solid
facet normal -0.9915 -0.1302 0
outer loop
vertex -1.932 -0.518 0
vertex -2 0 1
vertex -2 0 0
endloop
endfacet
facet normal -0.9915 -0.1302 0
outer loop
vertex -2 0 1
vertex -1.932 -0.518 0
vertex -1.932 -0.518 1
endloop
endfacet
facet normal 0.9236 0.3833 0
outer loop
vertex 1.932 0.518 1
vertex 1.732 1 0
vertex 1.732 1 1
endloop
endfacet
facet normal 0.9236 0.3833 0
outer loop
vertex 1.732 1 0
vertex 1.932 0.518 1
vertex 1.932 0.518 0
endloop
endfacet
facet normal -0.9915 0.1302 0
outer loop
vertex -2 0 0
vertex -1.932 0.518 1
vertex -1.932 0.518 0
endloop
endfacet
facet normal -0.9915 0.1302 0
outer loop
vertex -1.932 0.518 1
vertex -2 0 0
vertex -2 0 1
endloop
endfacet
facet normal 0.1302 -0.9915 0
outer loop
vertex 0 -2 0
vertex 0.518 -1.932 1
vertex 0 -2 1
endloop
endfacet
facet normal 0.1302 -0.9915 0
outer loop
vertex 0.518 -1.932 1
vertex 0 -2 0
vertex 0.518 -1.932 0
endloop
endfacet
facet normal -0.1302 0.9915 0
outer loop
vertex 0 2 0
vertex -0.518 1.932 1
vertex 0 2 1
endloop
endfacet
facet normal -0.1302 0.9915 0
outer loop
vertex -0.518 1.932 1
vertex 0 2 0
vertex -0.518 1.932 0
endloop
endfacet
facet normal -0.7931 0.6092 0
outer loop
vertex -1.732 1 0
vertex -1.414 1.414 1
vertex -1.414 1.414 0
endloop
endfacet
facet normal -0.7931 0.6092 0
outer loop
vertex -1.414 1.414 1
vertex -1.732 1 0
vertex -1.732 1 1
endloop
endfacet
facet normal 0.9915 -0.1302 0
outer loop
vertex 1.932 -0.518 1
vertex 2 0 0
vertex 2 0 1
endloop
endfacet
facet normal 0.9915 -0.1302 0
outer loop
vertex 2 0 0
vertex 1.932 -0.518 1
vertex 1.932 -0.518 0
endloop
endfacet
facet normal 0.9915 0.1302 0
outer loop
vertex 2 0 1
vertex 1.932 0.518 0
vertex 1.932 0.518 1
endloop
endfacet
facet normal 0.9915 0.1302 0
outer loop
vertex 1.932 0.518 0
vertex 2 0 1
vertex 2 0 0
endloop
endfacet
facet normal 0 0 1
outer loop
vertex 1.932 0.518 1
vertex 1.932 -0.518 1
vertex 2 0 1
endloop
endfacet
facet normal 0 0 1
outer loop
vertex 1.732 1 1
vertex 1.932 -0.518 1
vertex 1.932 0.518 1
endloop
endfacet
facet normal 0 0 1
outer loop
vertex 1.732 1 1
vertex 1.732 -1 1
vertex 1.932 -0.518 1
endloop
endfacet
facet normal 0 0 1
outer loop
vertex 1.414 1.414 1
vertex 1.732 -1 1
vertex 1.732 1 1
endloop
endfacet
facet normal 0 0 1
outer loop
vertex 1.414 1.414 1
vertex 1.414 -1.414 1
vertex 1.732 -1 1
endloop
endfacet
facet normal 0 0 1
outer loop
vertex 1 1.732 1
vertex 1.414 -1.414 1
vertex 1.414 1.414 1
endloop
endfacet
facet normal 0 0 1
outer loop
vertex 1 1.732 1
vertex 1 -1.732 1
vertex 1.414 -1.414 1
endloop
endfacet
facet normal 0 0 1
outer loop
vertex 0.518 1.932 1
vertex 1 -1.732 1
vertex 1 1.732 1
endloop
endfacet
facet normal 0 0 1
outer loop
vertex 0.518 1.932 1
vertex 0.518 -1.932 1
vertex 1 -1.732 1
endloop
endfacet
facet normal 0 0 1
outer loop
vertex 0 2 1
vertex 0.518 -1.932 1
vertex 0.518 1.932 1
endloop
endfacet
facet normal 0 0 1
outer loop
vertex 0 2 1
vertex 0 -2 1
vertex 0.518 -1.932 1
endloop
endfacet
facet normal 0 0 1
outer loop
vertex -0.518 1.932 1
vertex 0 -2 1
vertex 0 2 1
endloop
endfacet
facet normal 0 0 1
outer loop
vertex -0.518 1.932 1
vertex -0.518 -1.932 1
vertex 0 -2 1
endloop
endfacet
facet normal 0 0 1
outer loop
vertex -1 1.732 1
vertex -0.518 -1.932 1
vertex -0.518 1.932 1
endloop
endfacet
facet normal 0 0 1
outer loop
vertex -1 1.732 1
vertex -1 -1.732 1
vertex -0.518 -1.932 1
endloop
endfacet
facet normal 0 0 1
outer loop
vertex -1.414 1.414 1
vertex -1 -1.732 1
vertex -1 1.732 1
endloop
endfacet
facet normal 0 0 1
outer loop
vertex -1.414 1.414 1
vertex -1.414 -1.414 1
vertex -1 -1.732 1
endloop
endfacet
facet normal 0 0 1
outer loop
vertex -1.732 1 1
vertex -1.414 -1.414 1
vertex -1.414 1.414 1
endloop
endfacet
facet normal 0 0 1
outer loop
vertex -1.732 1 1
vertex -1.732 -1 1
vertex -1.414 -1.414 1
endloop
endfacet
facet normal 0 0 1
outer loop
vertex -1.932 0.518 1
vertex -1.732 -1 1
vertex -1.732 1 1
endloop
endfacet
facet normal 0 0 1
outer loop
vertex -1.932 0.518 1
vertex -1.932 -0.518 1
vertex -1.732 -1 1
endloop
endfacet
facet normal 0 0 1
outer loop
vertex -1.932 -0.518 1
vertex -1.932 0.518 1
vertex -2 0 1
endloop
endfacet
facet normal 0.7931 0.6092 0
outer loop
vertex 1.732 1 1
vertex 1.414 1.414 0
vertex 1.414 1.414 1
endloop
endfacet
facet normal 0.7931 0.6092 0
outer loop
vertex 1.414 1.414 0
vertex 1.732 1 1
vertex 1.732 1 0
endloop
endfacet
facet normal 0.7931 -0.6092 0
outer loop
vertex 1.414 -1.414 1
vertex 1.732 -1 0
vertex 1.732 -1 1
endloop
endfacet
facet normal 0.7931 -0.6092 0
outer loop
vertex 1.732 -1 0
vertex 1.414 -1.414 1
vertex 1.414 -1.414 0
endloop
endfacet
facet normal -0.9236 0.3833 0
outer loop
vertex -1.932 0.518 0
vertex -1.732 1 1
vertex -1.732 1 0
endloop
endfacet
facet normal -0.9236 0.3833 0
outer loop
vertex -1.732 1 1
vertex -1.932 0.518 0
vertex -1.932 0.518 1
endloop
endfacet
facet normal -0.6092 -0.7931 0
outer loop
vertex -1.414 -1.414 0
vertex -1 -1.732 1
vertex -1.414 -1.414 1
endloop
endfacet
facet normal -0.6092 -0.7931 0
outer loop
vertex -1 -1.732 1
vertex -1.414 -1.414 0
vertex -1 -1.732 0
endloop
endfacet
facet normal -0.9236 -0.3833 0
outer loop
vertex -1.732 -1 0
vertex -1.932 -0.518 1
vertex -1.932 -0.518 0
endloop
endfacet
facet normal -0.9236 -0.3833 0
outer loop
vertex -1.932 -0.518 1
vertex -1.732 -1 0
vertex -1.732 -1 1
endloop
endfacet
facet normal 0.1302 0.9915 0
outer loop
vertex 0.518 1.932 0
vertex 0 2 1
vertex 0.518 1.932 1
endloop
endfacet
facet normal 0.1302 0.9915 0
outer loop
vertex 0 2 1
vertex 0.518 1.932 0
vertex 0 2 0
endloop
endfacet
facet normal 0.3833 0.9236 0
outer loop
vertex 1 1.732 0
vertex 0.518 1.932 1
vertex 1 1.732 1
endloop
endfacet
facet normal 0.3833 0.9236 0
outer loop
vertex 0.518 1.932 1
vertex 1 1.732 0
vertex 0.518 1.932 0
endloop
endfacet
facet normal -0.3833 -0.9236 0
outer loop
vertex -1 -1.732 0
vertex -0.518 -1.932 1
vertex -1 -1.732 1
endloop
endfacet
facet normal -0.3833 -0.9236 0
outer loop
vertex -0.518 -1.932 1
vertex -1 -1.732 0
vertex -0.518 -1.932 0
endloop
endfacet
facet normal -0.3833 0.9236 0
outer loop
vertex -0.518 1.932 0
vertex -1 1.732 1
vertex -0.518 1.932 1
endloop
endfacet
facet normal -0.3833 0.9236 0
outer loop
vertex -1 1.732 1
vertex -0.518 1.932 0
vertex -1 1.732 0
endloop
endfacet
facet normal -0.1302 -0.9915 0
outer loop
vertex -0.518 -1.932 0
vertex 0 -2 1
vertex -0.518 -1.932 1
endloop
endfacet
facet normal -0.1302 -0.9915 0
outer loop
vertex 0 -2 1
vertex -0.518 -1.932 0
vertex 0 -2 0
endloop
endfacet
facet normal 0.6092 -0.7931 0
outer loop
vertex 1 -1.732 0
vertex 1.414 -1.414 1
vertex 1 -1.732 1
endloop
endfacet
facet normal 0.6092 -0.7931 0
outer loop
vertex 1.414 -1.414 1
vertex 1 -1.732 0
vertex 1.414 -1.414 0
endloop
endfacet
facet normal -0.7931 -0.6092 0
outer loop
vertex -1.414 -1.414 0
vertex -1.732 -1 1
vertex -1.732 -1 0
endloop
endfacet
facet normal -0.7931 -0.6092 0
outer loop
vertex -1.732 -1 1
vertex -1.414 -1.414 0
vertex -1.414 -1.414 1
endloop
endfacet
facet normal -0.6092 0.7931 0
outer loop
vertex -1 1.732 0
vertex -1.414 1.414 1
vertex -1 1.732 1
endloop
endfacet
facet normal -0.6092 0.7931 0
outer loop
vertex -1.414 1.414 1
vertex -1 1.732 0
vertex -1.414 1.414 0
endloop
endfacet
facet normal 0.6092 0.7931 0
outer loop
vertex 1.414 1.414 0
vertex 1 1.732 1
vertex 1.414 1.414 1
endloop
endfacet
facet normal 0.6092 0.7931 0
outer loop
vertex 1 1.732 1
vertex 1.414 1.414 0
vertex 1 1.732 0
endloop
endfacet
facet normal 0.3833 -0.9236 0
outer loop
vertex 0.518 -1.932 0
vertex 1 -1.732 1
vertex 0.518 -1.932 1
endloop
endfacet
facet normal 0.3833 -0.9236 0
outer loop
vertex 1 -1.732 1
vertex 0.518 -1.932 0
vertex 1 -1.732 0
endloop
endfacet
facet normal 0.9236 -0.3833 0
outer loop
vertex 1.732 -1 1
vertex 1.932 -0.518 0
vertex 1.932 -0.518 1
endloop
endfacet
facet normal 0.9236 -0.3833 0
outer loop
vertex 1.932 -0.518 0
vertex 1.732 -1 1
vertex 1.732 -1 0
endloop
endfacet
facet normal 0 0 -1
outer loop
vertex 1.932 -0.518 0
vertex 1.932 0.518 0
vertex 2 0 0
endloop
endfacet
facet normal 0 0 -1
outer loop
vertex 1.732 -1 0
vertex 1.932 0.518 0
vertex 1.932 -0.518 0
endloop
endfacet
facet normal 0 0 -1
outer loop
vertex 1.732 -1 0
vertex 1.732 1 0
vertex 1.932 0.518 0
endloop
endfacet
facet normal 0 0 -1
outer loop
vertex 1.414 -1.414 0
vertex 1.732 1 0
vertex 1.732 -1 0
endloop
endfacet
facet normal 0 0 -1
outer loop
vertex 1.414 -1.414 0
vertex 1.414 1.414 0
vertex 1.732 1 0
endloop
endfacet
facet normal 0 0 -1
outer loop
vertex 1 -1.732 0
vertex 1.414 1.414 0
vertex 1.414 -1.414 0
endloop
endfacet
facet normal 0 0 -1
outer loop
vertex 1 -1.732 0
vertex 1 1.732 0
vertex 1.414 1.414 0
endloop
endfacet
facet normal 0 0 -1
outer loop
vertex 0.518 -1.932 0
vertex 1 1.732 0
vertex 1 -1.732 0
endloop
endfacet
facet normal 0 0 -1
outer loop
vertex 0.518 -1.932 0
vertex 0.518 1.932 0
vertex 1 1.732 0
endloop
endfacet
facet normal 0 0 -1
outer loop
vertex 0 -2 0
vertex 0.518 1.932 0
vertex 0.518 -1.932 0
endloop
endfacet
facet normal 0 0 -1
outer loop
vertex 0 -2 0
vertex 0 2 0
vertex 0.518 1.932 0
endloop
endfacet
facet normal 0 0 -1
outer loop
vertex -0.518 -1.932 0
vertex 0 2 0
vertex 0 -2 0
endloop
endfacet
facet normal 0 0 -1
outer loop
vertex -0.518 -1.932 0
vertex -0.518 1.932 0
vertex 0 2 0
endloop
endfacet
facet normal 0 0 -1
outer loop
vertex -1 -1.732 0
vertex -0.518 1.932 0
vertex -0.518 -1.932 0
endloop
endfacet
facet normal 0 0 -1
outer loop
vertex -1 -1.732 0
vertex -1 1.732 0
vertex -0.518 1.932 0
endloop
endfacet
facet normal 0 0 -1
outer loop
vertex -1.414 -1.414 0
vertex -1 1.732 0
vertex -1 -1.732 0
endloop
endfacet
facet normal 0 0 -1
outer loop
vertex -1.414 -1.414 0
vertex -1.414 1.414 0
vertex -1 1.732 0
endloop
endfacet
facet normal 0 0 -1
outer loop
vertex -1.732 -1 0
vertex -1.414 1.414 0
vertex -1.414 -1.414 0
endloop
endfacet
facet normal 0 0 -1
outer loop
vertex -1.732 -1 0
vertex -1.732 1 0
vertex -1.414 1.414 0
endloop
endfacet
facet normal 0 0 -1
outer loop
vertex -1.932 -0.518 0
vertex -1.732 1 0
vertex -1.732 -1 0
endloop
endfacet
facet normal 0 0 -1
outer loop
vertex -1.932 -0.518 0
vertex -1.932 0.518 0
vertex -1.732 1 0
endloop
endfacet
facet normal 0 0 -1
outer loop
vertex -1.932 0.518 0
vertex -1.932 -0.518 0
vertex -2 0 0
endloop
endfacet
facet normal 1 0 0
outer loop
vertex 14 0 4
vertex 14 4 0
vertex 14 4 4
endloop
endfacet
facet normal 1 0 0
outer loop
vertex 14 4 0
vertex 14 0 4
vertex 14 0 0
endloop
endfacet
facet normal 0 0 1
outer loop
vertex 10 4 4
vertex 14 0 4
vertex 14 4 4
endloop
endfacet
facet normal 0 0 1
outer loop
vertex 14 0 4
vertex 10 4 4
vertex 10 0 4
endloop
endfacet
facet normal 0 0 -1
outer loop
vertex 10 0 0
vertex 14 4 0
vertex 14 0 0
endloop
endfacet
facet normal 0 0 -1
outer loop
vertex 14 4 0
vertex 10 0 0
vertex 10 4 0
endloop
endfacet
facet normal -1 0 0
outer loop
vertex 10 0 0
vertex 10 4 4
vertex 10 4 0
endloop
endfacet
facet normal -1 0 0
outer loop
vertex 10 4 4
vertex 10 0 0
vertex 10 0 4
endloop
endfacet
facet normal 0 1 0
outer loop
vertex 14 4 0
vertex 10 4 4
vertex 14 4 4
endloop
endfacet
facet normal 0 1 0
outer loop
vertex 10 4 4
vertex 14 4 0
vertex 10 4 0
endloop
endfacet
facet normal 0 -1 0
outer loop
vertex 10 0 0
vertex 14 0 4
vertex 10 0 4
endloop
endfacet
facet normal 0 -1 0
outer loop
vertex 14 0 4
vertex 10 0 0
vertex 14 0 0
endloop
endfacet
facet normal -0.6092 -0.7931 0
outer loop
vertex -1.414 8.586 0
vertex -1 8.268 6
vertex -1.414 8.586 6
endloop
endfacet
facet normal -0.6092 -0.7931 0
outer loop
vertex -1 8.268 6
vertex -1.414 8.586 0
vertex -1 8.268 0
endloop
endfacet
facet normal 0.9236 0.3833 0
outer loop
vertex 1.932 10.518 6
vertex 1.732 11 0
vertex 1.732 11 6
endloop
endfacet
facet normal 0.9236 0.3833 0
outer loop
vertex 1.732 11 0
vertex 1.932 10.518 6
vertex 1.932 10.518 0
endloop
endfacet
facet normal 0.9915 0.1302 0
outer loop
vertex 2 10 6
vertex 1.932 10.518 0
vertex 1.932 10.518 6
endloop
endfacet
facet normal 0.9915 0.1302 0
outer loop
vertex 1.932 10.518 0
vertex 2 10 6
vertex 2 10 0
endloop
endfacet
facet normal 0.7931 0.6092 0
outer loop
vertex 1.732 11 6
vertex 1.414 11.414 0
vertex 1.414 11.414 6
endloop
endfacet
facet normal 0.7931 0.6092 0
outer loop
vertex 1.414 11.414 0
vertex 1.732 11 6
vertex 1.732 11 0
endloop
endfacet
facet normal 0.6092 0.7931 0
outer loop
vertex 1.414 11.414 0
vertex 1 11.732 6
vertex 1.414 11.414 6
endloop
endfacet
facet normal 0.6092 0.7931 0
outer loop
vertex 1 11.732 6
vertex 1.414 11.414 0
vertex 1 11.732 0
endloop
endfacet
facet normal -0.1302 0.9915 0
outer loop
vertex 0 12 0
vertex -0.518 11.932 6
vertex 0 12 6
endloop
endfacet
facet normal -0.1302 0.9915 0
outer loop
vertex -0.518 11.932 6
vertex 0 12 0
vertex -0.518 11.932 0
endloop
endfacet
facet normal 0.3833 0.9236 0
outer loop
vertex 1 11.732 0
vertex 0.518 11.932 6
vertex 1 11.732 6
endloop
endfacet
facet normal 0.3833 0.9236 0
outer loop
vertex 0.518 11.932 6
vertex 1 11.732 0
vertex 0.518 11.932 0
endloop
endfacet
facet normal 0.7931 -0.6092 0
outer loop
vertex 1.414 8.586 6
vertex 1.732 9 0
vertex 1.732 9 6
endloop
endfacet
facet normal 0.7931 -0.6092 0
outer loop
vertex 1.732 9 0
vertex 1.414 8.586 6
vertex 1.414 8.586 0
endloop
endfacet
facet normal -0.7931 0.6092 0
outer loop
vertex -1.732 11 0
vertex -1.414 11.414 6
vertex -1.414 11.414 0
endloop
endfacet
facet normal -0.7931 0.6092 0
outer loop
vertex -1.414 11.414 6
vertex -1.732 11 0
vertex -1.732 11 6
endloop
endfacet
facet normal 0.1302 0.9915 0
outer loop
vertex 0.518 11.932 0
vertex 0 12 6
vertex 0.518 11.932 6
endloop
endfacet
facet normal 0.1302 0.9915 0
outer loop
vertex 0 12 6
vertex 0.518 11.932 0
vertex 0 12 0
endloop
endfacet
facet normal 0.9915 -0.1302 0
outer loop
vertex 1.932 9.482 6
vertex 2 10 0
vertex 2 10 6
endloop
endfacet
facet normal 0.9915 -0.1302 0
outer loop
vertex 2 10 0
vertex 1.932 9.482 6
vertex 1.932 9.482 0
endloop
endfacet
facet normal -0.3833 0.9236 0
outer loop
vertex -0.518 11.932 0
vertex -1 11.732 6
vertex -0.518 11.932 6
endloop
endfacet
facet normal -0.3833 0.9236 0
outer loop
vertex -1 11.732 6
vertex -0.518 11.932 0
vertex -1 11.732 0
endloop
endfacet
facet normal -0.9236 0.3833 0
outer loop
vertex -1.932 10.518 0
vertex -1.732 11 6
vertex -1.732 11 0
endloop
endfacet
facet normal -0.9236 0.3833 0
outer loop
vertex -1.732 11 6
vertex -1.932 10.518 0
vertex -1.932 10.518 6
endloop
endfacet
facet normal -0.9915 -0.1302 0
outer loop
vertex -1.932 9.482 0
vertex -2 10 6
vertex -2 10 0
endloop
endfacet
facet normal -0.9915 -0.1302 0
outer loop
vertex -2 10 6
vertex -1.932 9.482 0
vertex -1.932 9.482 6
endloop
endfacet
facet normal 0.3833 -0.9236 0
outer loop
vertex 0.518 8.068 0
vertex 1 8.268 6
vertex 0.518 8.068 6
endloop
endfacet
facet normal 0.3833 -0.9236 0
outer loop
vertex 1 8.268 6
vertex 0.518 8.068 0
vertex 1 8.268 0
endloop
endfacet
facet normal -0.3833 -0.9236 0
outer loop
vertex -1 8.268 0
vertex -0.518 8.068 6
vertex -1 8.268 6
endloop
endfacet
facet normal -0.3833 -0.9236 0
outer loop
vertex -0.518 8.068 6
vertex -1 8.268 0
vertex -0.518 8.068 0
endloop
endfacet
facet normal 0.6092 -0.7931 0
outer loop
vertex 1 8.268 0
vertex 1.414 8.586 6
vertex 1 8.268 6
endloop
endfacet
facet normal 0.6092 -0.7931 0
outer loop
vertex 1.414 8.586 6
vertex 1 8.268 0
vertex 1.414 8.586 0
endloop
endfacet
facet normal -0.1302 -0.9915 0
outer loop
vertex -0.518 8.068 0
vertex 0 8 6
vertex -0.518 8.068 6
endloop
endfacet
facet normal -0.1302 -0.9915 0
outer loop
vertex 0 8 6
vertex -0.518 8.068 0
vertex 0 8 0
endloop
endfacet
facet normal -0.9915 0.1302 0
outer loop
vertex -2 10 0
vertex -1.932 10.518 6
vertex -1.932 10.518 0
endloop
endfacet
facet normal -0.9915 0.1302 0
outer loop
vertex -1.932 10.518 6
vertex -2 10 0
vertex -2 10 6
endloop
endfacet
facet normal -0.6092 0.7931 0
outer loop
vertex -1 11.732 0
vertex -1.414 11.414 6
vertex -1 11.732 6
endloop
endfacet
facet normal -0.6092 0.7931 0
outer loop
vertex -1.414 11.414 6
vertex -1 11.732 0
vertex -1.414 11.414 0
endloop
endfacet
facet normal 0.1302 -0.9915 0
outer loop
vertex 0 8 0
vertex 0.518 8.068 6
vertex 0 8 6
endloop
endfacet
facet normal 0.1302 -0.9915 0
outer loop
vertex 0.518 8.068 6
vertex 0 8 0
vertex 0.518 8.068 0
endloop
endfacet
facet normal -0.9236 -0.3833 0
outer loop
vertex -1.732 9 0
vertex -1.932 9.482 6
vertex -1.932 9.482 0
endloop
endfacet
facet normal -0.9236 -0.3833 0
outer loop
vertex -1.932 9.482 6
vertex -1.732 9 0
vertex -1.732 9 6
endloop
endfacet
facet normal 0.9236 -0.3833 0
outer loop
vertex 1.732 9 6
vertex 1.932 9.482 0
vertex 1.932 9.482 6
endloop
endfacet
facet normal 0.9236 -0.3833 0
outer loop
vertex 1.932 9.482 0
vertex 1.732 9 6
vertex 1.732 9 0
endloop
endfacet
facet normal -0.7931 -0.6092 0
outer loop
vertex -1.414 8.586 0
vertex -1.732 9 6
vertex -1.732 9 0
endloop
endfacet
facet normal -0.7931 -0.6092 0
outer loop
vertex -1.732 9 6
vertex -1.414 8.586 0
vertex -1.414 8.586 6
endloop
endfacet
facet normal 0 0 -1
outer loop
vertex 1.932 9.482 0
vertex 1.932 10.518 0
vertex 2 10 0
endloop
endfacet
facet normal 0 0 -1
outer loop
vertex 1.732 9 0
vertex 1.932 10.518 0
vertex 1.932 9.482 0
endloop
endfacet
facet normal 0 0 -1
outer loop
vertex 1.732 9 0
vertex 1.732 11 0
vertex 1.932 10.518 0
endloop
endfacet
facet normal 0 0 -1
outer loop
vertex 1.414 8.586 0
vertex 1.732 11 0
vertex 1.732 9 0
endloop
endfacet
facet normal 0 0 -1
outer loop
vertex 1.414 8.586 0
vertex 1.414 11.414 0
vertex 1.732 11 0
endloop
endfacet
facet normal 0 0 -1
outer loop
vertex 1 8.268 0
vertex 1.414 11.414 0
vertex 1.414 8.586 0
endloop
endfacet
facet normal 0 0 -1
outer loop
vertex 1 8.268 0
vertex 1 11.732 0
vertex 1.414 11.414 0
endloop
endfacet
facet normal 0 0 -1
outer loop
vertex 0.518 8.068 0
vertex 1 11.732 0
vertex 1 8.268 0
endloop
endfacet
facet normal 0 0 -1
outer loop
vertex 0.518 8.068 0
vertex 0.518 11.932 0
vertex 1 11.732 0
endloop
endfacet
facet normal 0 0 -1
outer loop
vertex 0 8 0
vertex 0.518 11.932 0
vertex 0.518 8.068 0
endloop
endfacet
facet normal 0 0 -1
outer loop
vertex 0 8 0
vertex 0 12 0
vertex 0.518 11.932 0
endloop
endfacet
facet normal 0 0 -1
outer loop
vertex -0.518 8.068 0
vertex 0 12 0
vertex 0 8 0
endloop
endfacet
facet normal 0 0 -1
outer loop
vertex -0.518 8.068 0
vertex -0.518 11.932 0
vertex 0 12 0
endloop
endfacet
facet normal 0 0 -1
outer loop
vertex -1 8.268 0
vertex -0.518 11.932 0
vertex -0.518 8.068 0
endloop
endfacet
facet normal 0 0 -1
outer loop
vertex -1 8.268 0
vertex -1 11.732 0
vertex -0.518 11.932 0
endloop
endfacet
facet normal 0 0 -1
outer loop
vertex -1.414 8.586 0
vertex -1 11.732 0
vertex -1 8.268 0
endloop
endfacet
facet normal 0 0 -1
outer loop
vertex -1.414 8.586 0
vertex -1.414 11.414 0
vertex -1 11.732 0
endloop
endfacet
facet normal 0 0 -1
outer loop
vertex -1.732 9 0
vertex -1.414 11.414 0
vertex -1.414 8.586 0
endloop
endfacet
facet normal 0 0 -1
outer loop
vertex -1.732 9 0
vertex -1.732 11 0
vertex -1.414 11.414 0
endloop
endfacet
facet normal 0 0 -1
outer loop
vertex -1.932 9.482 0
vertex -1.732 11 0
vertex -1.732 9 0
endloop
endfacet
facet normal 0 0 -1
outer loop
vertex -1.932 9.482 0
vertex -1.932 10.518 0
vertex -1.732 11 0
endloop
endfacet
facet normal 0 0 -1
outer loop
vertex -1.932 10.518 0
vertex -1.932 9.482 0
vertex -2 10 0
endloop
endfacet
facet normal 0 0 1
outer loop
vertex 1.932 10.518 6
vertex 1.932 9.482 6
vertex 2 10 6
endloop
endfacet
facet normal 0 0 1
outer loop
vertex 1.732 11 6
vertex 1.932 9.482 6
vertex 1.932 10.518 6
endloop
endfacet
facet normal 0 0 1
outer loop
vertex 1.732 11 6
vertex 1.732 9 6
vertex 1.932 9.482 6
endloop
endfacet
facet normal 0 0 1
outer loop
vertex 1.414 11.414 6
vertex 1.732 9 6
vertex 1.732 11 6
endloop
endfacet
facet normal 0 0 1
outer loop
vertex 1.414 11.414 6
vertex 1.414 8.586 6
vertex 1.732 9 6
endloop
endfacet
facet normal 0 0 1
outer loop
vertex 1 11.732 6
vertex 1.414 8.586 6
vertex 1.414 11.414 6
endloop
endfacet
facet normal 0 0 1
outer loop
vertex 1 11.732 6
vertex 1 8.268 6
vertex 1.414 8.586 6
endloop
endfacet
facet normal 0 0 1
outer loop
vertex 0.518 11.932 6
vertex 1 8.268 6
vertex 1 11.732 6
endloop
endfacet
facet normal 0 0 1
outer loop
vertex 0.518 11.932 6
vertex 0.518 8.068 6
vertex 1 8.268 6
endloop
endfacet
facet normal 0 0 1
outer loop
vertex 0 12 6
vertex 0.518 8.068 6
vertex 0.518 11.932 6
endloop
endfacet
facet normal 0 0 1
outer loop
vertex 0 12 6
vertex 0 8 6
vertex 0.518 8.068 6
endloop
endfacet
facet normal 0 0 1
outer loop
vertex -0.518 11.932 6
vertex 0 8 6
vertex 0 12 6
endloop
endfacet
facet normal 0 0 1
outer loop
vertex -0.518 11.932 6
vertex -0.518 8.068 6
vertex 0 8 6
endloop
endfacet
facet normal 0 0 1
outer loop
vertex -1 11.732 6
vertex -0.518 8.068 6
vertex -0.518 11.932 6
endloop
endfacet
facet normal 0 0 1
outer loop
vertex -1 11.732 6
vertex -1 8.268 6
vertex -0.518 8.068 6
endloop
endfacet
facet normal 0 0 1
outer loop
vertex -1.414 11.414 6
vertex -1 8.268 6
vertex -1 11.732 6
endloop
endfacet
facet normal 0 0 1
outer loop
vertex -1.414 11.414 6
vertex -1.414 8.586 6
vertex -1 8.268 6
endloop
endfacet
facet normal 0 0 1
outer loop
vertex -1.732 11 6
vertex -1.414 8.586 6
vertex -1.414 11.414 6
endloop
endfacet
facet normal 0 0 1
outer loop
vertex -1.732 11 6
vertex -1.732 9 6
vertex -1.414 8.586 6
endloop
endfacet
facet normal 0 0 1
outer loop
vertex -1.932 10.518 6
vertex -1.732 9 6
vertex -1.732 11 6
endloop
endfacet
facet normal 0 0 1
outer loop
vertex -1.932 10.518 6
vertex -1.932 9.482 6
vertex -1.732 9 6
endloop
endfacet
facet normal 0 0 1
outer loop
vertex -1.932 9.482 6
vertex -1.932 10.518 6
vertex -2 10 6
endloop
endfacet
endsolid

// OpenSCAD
// file: lib/pegs.scad
// A small library, pulled in by include.scad (`include`) and use.scad
// (`use`). Run on its own it renders its demo peg.

// File-scope variable: visible to this file's functions and modules even
// when the file is `use`d, but never to the file that uses it.
peg_radius = 2;

function peg_double(x) = x * 2;
function peg_default_radius() = peg_radius;

module peg(h = 4, r = peg_radius) cylinder(h = h, r = r, $fn = 24);

// Demo geometry: part of the model when this file is included or run
// directly, never when it is used.
peg(1);
// main file
// include <file>: the library's text is inserted in place — its variables,
// its functions and modules, and its top-level geometry (the demo peg).
include <lib/pegs.scad>

translate([10, 0, 0]) cube(peg_double(peg_radius));
translate([0, 10, 0]) peg(h = 6);
